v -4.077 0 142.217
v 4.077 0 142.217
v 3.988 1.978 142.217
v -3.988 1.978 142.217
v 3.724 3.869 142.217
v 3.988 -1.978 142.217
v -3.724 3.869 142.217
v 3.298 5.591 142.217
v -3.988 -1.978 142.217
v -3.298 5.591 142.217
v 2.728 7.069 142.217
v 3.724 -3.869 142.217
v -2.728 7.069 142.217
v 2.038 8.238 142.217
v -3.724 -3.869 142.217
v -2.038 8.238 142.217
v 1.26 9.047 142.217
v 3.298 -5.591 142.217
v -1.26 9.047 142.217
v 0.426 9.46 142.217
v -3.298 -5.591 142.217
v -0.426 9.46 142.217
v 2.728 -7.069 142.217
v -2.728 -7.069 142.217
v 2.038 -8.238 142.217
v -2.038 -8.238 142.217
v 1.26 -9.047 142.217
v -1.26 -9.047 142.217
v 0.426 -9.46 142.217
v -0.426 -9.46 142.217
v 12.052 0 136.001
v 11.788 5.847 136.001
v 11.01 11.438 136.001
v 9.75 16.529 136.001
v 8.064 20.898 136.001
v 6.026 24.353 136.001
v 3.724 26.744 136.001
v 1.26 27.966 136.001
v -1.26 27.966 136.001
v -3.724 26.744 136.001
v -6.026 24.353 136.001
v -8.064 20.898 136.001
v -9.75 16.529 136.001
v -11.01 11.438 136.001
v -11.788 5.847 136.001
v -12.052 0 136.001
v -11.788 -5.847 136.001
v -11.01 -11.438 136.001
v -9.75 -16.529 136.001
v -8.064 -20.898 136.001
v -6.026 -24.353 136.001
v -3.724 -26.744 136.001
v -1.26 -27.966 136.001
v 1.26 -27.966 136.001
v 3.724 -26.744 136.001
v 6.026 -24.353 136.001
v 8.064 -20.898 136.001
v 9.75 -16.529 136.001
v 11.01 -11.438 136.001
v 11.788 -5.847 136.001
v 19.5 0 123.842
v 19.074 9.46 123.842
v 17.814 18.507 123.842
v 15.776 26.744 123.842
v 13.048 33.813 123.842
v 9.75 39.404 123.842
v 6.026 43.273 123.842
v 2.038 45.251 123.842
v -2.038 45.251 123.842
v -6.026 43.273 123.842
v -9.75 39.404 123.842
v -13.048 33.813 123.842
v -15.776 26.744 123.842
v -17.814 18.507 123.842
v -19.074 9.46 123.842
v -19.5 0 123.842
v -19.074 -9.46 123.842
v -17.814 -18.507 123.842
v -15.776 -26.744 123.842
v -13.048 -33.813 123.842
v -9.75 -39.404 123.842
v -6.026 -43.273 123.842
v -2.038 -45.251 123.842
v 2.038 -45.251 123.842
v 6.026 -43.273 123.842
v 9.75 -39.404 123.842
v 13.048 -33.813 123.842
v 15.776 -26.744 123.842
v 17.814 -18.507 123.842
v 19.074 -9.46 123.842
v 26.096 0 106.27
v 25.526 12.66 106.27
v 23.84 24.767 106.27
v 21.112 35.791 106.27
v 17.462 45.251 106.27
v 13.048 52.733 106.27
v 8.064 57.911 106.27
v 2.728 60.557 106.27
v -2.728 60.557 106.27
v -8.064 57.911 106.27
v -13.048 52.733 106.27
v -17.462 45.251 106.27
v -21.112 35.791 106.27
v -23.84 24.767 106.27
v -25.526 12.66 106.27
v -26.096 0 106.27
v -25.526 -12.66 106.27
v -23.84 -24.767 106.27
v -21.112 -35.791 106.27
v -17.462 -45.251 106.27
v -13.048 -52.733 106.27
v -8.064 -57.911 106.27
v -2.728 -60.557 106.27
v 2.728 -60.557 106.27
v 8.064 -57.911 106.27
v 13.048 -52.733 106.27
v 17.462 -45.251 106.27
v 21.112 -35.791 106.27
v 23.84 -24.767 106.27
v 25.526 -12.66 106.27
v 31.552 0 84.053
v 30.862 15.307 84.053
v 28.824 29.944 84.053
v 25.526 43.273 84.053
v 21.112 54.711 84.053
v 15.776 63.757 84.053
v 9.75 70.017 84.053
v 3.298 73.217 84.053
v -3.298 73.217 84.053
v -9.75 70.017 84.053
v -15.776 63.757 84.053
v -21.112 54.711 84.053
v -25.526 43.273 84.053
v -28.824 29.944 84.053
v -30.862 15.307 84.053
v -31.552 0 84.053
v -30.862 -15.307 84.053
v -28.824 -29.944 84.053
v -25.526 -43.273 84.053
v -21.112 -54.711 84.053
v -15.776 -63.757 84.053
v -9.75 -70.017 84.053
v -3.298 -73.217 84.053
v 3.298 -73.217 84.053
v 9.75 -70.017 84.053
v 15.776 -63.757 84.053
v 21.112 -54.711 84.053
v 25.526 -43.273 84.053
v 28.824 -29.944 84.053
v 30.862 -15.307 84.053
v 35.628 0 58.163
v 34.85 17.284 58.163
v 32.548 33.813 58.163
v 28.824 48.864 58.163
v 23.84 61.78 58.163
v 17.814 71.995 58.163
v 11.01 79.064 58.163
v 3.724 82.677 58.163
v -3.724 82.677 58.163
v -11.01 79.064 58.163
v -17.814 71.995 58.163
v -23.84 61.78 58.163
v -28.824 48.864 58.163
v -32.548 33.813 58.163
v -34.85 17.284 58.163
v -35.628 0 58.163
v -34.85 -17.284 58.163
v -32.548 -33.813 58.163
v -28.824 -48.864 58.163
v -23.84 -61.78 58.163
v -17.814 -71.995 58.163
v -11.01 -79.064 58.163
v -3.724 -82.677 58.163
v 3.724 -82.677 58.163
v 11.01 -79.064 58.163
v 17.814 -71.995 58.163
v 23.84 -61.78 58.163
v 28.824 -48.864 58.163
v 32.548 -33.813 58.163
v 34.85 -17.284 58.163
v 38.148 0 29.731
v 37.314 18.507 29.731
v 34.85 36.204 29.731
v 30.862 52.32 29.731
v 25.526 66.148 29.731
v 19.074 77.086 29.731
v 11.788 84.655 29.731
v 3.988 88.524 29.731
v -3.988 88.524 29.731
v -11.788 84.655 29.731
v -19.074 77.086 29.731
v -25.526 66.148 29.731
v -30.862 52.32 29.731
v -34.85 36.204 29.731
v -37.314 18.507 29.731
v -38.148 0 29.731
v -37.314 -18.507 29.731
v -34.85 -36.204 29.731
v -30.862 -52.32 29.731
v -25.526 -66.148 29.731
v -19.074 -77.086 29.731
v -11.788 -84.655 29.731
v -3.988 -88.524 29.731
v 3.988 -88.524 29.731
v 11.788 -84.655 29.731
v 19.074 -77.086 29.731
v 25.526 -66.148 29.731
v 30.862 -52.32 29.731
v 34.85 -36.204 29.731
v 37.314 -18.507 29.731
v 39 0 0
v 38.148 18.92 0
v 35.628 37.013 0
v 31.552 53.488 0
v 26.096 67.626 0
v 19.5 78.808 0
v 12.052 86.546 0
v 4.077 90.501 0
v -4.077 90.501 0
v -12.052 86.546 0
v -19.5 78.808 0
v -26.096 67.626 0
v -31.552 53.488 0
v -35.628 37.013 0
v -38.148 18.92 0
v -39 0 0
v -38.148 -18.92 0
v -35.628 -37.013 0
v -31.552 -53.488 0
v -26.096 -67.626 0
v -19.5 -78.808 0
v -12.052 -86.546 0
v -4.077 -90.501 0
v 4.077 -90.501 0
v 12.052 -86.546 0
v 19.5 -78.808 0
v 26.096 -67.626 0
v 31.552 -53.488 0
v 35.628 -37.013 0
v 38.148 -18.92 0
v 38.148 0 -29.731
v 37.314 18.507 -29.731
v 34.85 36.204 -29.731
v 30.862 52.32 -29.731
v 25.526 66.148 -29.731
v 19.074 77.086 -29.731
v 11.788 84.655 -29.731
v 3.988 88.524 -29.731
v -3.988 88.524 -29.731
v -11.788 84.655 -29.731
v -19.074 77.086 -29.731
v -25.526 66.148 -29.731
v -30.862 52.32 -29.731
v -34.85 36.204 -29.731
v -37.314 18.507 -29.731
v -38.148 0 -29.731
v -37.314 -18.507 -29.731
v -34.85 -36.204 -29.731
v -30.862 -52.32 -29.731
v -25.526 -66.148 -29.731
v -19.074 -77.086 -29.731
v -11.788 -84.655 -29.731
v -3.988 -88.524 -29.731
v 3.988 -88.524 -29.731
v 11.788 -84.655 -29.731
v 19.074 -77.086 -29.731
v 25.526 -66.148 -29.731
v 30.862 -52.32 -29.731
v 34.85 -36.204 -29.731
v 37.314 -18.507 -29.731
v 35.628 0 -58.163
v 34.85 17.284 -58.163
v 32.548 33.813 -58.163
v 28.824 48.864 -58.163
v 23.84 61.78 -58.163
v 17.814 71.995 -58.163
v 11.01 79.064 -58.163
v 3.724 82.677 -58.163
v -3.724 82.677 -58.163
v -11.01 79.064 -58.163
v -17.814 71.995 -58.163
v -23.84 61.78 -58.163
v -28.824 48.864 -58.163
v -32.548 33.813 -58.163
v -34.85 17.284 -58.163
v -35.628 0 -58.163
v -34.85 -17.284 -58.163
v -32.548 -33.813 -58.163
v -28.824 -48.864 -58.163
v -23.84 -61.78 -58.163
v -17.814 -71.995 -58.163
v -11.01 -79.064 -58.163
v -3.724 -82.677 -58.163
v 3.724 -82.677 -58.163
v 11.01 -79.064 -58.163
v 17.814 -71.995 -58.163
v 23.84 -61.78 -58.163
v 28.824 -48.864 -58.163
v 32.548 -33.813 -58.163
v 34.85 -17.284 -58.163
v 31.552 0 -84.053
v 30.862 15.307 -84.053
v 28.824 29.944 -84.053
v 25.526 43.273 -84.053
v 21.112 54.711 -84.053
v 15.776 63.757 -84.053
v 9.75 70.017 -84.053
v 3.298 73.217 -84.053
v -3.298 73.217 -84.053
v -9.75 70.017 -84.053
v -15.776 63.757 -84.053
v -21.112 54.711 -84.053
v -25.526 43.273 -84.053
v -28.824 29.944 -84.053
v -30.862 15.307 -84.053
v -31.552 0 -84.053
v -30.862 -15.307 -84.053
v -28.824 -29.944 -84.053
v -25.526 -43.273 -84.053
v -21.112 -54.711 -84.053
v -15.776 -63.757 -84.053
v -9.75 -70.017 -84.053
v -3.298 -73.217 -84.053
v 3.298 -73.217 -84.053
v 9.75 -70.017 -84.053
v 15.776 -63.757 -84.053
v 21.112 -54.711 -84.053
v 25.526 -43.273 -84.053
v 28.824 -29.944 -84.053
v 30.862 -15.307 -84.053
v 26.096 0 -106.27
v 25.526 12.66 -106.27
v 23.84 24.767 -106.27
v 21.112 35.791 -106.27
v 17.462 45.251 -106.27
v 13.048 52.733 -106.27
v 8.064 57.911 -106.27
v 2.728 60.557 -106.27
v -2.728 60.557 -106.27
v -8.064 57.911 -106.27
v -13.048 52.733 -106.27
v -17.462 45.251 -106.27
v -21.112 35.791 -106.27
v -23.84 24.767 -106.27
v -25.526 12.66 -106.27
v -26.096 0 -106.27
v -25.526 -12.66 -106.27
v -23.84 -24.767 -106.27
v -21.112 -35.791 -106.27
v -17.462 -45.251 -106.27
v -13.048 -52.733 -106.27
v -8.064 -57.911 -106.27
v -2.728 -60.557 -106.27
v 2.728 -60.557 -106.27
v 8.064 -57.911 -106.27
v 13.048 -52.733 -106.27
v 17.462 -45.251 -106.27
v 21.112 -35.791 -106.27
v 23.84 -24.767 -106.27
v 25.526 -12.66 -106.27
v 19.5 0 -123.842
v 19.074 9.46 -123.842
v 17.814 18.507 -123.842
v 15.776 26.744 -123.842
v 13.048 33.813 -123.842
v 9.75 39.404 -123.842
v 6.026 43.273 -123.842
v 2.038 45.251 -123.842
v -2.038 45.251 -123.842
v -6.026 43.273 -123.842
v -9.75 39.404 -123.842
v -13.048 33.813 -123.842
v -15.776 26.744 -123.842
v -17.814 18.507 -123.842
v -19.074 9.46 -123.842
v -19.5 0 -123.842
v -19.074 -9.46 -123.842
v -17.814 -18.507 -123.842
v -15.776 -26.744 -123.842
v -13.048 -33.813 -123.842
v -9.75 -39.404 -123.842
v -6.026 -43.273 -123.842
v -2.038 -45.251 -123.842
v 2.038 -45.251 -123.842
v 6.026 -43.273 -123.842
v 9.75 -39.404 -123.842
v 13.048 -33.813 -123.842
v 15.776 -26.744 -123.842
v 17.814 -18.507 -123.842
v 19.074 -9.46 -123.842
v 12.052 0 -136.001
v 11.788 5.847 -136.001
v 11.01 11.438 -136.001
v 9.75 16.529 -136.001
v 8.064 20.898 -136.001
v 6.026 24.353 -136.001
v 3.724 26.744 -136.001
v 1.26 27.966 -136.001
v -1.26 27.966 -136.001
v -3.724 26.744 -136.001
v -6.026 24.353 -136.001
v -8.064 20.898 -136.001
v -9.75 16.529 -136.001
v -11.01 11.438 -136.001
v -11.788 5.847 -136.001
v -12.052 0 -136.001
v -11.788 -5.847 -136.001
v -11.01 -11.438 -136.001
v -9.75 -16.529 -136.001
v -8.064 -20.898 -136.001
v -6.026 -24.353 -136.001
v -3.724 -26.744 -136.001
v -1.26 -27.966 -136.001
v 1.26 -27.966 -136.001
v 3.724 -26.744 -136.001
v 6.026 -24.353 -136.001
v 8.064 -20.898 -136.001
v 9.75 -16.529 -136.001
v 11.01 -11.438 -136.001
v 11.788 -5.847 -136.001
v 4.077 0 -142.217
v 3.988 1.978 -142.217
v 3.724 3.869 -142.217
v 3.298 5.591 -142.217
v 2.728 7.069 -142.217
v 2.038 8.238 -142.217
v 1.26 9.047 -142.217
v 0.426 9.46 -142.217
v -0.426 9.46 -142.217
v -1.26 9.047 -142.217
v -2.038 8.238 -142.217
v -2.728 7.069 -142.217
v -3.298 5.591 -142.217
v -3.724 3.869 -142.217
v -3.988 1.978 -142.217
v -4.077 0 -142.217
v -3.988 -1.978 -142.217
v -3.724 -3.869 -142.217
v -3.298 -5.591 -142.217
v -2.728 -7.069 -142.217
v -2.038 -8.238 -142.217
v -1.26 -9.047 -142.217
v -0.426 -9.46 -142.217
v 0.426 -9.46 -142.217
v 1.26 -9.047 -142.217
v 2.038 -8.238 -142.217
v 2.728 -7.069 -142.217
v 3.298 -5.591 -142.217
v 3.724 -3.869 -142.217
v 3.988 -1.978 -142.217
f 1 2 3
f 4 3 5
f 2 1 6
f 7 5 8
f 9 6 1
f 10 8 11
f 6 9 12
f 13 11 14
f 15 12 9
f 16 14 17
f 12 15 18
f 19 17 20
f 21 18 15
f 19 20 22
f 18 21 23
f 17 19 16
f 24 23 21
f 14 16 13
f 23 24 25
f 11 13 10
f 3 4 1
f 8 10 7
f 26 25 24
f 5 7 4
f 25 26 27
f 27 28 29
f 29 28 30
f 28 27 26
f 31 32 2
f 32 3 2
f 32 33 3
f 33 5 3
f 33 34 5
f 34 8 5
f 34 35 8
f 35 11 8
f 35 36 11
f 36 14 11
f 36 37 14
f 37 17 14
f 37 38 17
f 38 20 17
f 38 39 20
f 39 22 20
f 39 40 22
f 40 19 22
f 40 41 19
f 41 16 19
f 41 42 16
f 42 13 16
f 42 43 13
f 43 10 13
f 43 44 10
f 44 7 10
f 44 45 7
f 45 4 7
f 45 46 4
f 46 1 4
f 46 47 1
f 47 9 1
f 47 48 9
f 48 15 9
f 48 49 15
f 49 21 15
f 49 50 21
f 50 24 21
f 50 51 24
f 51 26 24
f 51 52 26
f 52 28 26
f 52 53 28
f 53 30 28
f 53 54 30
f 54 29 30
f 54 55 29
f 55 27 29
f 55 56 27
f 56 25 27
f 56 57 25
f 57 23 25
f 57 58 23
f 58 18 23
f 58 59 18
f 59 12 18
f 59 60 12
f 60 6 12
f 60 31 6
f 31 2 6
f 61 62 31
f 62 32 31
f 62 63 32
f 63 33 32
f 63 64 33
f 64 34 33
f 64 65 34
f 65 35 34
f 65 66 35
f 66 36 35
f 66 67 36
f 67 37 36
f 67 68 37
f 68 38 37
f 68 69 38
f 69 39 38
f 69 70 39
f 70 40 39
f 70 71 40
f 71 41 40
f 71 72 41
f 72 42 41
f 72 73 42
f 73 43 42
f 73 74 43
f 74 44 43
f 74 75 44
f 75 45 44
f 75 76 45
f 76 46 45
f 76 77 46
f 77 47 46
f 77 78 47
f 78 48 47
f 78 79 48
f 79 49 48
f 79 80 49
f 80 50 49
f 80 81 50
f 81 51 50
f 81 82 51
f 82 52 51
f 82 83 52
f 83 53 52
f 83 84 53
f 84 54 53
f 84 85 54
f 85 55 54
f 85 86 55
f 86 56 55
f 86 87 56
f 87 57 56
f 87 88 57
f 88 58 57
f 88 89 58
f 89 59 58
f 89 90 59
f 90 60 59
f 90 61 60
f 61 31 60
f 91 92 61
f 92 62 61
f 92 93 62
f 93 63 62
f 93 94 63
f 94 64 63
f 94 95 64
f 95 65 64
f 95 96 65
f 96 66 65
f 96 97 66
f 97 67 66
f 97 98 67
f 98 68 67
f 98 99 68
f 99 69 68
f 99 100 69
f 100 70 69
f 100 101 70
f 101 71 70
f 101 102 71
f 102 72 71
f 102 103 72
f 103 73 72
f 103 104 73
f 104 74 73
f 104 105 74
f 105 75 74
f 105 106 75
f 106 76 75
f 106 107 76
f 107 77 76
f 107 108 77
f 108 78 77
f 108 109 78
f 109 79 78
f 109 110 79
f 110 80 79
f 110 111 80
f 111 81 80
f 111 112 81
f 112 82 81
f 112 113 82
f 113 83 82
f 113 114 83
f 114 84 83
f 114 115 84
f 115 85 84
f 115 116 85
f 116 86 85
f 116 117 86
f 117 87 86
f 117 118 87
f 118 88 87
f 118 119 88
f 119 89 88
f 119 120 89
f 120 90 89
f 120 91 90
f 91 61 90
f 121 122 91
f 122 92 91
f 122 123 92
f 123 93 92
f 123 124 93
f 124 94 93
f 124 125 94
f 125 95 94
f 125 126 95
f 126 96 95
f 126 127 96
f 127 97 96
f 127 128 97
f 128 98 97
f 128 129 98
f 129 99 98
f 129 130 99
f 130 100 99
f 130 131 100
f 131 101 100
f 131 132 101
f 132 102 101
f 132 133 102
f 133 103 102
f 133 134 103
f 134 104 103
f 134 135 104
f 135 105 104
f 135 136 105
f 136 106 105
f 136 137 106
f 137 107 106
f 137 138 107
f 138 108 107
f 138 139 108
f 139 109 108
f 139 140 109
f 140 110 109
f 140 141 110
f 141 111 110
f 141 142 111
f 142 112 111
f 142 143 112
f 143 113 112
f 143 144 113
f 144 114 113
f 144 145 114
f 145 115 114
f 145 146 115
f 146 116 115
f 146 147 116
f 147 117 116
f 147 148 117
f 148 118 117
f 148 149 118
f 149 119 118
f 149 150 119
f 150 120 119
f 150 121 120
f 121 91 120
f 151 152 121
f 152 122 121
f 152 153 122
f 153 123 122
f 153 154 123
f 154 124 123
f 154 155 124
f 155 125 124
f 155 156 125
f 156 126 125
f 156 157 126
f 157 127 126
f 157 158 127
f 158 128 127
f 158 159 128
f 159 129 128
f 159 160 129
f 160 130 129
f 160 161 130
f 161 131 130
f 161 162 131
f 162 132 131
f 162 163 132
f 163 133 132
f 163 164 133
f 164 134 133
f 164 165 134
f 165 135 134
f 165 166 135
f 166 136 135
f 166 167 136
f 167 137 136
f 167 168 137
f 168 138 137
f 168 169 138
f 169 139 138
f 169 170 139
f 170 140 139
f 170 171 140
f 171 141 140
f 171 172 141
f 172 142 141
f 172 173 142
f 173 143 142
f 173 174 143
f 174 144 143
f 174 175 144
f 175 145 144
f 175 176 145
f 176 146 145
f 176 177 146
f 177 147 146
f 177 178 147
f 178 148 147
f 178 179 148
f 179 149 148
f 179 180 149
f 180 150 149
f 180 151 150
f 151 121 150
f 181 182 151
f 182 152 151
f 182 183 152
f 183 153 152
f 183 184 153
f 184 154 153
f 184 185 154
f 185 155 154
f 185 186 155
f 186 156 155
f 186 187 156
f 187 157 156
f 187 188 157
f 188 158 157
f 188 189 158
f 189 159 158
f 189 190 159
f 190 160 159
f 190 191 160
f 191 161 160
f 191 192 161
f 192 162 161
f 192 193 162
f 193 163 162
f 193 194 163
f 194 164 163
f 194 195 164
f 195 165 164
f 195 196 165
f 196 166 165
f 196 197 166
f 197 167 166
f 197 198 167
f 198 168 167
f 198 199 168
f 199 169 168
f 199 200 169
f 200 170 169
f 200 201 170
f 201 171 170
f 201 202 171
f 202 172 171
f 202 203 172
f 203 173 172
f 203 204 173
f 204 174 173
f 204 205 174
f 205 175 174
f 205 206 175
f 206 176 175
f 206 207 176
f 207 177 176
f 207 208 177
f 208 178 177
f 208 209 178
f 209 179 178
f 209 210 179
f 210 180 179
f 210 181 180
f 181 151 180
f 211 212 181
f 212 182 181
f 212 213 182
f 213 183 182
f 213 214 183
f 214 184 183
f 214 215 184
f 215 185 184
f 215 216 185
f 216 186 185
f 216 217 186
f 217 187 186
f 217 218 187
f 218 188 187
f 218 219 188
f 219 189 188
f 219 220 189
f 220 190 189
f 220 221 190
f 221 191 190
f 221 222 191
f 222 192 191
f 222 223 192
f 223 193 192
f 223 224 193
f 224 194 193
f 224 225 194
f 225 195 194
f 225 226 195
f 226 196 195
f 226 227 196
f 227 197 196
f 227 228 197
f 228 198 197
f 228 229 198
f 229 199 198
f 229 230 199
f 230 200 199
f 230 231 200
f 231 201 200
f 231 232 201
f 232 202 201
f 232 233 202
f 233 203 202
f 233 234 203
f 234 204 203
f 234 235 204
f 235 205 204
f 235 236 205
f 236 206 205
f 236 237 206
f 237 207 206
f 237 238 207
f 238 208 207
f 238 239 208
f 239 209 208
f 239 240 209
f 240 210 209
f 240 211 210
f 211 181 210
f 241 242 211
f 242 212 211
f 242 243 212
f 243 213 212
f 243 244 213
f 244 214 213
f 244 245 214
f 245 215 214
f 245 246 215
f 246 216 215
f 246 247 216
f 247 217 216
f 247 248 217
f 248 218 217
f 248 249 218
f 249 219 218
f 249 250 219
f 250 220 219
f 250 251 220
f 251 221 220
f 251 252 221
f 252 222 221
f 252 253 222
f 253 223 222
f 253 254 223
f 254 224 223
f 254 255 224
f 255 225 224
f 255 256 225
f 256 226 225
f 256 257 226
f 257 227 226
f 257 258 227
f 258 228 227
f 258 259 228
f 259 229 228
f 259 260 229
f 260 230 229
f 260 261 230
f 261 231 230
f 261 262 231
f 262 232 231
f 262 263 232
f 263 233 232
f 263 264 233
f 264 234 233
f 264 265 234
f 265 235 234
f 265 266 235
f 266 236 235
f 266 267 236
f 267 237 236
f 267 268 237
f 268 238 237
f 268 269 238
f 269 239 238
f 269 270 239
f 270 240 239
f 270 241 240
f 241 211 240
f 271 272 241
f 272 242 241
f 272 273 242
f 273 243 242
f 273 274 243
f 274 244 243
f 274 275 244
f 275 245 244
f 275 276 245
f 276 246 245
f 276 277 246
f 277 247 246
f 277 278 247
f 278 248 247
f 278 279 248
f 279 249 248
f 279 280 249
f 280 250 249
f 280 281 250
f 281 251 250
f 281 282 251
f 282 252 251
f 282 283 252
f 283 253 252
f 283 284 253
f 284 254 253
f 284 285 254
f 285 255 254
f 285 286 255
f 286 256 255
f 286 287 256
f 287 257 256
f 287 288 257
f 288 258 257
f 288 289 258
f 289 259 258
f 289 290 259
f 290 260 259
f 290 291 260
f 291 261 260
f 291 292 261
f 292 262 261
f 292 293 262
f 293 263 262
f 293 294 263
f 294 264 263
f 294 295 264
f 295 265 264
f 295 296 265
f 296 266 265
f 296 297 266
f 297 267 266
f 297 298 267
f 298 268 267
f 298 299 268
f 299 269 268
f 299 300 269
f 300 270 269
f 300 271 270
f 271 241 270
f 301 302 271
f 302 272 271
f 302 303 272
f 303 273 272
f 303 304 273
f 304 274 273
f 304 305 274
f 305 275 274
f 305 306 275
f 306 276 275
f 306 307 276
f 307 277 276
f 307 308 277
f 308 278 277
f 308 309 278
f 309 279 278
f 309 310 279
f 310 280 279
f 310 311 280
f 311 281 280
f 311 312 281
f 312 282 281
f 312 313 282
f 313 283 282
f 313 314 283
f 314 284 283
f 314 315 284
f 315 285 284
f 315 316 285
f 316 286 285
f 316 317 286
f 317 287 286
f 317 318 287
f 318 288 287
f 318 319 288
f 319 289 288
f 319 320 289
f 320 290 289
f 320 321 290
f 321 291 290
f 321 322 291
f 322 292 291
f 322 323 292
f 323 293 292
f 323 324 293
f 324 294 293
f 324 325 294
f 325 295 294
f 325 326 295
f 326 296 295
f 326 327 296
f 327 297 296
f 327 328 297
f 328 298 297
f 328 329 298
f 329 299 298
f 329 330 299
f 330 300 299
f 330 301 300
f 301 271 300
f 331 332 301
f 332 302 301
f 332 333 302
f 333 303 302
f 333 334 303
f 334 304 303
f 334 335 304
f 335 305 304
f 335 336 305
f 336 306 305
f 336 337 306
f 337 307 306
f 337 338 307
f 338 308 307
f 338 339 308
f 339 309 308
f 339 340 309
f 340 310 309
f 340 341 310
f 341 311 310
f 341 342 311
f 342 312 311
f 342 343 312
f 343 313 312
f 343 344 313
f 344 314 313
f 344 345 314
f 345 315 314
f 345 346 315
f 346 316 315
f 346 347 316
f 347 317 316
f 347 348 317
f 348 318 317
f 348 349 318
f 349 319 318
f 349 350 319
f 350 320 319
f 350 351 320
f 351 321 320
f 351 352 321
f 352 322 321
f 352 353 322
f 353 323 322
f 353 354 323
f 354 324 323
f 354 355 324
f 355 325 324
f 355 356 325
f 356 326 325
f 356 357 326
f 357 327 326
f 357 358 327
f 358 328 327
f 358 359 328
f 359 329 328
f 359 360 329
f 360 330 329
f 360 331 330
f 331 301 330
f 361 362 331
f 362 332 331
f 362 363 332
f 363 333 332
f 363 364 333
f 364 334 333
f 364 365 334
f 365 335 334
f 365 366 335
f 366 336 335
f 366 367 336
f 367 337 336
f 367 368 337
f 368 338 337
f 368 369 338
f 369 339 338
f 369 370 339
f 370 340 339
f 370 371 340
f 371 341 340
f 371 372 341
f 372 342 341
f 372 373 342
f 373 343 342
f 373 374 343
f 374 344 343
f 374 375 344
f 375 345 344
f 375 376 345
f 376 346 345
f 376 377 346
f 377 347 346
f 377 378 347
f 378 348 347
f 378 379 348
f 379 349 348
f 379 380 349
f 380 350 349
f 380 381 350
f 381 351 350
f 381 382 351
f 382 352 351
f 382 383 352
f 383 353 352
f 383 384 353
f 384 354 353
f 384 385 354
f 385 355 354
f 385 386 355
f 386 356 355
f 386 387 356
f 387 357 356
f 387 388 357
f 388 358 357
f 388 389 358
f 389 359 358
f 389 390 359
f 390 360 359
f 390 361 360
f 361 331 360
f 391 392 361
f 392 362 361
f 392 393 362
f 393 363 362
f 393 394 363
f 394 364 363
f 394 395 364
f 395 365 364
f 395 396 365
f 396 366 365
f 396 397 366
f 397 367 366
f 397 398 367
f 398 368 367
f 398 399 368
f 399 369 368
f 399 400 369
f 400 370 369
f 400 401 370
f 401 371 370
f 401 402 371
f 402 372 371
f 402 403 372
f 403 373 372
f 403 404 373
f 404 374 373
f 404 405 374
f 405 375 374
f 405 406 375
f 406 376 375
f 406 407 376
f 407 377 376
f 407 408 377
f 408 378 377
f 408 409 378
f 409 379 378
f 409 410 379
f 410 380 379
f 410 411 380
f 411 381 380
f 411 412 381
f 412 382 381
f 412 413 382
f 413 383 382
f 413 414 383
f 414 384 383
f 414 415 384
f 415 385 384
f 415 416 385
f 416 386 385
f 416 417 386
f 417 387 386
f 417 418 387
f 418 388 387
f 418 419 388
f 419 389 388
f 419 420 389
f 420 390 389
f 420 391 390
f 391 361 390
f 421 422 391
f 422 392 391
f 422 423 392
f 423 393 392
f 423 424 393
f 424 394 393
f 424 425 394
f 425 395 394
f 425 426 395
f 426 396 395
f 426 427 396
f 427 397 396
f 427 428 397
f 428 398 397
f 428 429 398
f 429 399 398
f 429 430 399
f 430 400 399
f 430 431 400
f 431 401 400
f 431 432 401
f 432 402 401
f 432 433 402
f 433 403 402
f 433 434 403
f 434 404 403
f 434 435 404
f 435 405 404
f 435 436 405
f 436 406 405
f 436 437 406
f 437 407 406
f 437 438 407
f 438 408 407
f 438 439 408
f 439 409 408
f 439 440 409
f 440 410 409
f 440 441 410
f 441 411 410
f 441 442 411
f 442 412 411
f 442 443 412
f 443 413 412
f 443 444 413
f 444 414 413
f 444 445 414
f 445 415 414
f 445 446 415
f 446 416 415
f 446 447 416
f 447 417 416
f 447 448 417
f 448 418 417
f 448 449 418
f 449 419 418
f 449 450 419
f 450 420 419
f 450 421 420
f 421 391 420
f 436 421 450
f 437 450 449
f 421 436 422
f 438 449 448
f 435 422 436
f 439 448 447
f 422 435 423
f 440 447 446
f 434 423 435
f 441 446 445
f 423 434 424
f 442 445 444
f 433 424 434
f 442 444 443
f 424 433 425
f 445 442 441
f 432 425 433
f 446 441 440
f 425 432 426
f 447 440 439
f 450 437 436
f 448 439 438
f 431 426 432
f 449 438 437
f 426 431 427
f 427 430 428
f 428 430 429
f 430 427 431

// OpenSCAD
// Generated by SolidPython 1.0.1 on 2020-07-29 00:39:25


scale(v = [3, 7, 11]) {
	sphere(r = 13);
}
/***********************************************
*********      SolidPython code:      **********
************************************************
 
# import packages: SolidPython
from solid import *
from solid.utils import *
from itertools import chain, combinations


class Resize:

    def __init__(self, scad_file):
        self.scad_file = scad_file
        #self.scad_file = import_scad(scad_file)
        # cone/cylinder param:
        self.r1 = 0
        self.r2 = 0
        self.h = 0
        # rectangular prism param:
        self.w = 0
        self.l = 0
        # ellipse param:
        self.r = 0

    # import OpenScad code (file name corresponds to shape)


    # classify shape + parameters
    def assign(self, param1, param2, param3):
        if self.scad_file == 'cone.scad':
            self.r1 = param1
            self.r2 = param2
            self.h = param3
        elif self.scad_file == 'cylinder.scad':
            self.r1 = param1
            self.r2 = param2
            self.h = param3
        elif self.scad_file == 'rectangularPrism.scad':
            self.h = param1
            self.l = param2
            self.w = param3
        else:
            self.r = param1
            self.h = param2

    # resize parameters
    def iterate(self):
        x = range(3, 20, 2)
        i = 1
        if self.scad_file == 'cone.scad':
            tempList = list(combinations(x, 2))
            for temp in tempList:
                param1 = temp[0]
                param2 = temp[1]
                filepath = 'produced_scad_files/' + 'cone' + str(param1) + '_' + str(param2) + '_' + '.scad'
                scad_render_to_file(cylinder(h=param1, r1=param2, r2=0), filepath)

        elif self.scad_file == 'cylinder.scad':
            tempList = list(combinations(x, 3))
            for temp in tempList:
                param1 = temp[0]
                param2 = temp[1]
                filepath = 'produced_scad_files/' + 'cylinder' + str(param1) + '_' + str(param2) + '_' + '.scad'
                scad_render_to_file(cylinder(h=param1, r1=param2, r2=param2), filepath)

        elif self.scad_file == 'rectangularPrism.scad':
            tempList = list(combinations(x, 3))
            for temp in tempList:
                param1 = temp[0]
                param2 = temp[1]
                param3 = temp[2]
                filepath = 'produced_scad_files/' + 'rectangularPrism' + str(param1) + '_' + str(param2) + '_' + str(
                    param3) + '.scad'
                scad_render_to_file(cube(size=(param1, param2, param3)), filepath)

        elif self.scad_file == 'ellipse.scad':
            tempList = list(combinations(x, 4))
            for temp in tempList:
                param1 = temp[0]
                param2 = temp[1]
                param3 = temp[2]
                param4 = temp[3]
                filepath = 'produced_scad_files/' + 'ellipse' + str(param1) + '_' + str(param2) + '_' + str(param3) + '_' + str(param4) + '.scad'
                scad_render_to_file(scale([param1, param2, param3])(sphere(r=param4)), filepath)

    def render_to_scadfile(self):
        scad_render_to_file(scad, 'example.scad') 
 
************************************************/
